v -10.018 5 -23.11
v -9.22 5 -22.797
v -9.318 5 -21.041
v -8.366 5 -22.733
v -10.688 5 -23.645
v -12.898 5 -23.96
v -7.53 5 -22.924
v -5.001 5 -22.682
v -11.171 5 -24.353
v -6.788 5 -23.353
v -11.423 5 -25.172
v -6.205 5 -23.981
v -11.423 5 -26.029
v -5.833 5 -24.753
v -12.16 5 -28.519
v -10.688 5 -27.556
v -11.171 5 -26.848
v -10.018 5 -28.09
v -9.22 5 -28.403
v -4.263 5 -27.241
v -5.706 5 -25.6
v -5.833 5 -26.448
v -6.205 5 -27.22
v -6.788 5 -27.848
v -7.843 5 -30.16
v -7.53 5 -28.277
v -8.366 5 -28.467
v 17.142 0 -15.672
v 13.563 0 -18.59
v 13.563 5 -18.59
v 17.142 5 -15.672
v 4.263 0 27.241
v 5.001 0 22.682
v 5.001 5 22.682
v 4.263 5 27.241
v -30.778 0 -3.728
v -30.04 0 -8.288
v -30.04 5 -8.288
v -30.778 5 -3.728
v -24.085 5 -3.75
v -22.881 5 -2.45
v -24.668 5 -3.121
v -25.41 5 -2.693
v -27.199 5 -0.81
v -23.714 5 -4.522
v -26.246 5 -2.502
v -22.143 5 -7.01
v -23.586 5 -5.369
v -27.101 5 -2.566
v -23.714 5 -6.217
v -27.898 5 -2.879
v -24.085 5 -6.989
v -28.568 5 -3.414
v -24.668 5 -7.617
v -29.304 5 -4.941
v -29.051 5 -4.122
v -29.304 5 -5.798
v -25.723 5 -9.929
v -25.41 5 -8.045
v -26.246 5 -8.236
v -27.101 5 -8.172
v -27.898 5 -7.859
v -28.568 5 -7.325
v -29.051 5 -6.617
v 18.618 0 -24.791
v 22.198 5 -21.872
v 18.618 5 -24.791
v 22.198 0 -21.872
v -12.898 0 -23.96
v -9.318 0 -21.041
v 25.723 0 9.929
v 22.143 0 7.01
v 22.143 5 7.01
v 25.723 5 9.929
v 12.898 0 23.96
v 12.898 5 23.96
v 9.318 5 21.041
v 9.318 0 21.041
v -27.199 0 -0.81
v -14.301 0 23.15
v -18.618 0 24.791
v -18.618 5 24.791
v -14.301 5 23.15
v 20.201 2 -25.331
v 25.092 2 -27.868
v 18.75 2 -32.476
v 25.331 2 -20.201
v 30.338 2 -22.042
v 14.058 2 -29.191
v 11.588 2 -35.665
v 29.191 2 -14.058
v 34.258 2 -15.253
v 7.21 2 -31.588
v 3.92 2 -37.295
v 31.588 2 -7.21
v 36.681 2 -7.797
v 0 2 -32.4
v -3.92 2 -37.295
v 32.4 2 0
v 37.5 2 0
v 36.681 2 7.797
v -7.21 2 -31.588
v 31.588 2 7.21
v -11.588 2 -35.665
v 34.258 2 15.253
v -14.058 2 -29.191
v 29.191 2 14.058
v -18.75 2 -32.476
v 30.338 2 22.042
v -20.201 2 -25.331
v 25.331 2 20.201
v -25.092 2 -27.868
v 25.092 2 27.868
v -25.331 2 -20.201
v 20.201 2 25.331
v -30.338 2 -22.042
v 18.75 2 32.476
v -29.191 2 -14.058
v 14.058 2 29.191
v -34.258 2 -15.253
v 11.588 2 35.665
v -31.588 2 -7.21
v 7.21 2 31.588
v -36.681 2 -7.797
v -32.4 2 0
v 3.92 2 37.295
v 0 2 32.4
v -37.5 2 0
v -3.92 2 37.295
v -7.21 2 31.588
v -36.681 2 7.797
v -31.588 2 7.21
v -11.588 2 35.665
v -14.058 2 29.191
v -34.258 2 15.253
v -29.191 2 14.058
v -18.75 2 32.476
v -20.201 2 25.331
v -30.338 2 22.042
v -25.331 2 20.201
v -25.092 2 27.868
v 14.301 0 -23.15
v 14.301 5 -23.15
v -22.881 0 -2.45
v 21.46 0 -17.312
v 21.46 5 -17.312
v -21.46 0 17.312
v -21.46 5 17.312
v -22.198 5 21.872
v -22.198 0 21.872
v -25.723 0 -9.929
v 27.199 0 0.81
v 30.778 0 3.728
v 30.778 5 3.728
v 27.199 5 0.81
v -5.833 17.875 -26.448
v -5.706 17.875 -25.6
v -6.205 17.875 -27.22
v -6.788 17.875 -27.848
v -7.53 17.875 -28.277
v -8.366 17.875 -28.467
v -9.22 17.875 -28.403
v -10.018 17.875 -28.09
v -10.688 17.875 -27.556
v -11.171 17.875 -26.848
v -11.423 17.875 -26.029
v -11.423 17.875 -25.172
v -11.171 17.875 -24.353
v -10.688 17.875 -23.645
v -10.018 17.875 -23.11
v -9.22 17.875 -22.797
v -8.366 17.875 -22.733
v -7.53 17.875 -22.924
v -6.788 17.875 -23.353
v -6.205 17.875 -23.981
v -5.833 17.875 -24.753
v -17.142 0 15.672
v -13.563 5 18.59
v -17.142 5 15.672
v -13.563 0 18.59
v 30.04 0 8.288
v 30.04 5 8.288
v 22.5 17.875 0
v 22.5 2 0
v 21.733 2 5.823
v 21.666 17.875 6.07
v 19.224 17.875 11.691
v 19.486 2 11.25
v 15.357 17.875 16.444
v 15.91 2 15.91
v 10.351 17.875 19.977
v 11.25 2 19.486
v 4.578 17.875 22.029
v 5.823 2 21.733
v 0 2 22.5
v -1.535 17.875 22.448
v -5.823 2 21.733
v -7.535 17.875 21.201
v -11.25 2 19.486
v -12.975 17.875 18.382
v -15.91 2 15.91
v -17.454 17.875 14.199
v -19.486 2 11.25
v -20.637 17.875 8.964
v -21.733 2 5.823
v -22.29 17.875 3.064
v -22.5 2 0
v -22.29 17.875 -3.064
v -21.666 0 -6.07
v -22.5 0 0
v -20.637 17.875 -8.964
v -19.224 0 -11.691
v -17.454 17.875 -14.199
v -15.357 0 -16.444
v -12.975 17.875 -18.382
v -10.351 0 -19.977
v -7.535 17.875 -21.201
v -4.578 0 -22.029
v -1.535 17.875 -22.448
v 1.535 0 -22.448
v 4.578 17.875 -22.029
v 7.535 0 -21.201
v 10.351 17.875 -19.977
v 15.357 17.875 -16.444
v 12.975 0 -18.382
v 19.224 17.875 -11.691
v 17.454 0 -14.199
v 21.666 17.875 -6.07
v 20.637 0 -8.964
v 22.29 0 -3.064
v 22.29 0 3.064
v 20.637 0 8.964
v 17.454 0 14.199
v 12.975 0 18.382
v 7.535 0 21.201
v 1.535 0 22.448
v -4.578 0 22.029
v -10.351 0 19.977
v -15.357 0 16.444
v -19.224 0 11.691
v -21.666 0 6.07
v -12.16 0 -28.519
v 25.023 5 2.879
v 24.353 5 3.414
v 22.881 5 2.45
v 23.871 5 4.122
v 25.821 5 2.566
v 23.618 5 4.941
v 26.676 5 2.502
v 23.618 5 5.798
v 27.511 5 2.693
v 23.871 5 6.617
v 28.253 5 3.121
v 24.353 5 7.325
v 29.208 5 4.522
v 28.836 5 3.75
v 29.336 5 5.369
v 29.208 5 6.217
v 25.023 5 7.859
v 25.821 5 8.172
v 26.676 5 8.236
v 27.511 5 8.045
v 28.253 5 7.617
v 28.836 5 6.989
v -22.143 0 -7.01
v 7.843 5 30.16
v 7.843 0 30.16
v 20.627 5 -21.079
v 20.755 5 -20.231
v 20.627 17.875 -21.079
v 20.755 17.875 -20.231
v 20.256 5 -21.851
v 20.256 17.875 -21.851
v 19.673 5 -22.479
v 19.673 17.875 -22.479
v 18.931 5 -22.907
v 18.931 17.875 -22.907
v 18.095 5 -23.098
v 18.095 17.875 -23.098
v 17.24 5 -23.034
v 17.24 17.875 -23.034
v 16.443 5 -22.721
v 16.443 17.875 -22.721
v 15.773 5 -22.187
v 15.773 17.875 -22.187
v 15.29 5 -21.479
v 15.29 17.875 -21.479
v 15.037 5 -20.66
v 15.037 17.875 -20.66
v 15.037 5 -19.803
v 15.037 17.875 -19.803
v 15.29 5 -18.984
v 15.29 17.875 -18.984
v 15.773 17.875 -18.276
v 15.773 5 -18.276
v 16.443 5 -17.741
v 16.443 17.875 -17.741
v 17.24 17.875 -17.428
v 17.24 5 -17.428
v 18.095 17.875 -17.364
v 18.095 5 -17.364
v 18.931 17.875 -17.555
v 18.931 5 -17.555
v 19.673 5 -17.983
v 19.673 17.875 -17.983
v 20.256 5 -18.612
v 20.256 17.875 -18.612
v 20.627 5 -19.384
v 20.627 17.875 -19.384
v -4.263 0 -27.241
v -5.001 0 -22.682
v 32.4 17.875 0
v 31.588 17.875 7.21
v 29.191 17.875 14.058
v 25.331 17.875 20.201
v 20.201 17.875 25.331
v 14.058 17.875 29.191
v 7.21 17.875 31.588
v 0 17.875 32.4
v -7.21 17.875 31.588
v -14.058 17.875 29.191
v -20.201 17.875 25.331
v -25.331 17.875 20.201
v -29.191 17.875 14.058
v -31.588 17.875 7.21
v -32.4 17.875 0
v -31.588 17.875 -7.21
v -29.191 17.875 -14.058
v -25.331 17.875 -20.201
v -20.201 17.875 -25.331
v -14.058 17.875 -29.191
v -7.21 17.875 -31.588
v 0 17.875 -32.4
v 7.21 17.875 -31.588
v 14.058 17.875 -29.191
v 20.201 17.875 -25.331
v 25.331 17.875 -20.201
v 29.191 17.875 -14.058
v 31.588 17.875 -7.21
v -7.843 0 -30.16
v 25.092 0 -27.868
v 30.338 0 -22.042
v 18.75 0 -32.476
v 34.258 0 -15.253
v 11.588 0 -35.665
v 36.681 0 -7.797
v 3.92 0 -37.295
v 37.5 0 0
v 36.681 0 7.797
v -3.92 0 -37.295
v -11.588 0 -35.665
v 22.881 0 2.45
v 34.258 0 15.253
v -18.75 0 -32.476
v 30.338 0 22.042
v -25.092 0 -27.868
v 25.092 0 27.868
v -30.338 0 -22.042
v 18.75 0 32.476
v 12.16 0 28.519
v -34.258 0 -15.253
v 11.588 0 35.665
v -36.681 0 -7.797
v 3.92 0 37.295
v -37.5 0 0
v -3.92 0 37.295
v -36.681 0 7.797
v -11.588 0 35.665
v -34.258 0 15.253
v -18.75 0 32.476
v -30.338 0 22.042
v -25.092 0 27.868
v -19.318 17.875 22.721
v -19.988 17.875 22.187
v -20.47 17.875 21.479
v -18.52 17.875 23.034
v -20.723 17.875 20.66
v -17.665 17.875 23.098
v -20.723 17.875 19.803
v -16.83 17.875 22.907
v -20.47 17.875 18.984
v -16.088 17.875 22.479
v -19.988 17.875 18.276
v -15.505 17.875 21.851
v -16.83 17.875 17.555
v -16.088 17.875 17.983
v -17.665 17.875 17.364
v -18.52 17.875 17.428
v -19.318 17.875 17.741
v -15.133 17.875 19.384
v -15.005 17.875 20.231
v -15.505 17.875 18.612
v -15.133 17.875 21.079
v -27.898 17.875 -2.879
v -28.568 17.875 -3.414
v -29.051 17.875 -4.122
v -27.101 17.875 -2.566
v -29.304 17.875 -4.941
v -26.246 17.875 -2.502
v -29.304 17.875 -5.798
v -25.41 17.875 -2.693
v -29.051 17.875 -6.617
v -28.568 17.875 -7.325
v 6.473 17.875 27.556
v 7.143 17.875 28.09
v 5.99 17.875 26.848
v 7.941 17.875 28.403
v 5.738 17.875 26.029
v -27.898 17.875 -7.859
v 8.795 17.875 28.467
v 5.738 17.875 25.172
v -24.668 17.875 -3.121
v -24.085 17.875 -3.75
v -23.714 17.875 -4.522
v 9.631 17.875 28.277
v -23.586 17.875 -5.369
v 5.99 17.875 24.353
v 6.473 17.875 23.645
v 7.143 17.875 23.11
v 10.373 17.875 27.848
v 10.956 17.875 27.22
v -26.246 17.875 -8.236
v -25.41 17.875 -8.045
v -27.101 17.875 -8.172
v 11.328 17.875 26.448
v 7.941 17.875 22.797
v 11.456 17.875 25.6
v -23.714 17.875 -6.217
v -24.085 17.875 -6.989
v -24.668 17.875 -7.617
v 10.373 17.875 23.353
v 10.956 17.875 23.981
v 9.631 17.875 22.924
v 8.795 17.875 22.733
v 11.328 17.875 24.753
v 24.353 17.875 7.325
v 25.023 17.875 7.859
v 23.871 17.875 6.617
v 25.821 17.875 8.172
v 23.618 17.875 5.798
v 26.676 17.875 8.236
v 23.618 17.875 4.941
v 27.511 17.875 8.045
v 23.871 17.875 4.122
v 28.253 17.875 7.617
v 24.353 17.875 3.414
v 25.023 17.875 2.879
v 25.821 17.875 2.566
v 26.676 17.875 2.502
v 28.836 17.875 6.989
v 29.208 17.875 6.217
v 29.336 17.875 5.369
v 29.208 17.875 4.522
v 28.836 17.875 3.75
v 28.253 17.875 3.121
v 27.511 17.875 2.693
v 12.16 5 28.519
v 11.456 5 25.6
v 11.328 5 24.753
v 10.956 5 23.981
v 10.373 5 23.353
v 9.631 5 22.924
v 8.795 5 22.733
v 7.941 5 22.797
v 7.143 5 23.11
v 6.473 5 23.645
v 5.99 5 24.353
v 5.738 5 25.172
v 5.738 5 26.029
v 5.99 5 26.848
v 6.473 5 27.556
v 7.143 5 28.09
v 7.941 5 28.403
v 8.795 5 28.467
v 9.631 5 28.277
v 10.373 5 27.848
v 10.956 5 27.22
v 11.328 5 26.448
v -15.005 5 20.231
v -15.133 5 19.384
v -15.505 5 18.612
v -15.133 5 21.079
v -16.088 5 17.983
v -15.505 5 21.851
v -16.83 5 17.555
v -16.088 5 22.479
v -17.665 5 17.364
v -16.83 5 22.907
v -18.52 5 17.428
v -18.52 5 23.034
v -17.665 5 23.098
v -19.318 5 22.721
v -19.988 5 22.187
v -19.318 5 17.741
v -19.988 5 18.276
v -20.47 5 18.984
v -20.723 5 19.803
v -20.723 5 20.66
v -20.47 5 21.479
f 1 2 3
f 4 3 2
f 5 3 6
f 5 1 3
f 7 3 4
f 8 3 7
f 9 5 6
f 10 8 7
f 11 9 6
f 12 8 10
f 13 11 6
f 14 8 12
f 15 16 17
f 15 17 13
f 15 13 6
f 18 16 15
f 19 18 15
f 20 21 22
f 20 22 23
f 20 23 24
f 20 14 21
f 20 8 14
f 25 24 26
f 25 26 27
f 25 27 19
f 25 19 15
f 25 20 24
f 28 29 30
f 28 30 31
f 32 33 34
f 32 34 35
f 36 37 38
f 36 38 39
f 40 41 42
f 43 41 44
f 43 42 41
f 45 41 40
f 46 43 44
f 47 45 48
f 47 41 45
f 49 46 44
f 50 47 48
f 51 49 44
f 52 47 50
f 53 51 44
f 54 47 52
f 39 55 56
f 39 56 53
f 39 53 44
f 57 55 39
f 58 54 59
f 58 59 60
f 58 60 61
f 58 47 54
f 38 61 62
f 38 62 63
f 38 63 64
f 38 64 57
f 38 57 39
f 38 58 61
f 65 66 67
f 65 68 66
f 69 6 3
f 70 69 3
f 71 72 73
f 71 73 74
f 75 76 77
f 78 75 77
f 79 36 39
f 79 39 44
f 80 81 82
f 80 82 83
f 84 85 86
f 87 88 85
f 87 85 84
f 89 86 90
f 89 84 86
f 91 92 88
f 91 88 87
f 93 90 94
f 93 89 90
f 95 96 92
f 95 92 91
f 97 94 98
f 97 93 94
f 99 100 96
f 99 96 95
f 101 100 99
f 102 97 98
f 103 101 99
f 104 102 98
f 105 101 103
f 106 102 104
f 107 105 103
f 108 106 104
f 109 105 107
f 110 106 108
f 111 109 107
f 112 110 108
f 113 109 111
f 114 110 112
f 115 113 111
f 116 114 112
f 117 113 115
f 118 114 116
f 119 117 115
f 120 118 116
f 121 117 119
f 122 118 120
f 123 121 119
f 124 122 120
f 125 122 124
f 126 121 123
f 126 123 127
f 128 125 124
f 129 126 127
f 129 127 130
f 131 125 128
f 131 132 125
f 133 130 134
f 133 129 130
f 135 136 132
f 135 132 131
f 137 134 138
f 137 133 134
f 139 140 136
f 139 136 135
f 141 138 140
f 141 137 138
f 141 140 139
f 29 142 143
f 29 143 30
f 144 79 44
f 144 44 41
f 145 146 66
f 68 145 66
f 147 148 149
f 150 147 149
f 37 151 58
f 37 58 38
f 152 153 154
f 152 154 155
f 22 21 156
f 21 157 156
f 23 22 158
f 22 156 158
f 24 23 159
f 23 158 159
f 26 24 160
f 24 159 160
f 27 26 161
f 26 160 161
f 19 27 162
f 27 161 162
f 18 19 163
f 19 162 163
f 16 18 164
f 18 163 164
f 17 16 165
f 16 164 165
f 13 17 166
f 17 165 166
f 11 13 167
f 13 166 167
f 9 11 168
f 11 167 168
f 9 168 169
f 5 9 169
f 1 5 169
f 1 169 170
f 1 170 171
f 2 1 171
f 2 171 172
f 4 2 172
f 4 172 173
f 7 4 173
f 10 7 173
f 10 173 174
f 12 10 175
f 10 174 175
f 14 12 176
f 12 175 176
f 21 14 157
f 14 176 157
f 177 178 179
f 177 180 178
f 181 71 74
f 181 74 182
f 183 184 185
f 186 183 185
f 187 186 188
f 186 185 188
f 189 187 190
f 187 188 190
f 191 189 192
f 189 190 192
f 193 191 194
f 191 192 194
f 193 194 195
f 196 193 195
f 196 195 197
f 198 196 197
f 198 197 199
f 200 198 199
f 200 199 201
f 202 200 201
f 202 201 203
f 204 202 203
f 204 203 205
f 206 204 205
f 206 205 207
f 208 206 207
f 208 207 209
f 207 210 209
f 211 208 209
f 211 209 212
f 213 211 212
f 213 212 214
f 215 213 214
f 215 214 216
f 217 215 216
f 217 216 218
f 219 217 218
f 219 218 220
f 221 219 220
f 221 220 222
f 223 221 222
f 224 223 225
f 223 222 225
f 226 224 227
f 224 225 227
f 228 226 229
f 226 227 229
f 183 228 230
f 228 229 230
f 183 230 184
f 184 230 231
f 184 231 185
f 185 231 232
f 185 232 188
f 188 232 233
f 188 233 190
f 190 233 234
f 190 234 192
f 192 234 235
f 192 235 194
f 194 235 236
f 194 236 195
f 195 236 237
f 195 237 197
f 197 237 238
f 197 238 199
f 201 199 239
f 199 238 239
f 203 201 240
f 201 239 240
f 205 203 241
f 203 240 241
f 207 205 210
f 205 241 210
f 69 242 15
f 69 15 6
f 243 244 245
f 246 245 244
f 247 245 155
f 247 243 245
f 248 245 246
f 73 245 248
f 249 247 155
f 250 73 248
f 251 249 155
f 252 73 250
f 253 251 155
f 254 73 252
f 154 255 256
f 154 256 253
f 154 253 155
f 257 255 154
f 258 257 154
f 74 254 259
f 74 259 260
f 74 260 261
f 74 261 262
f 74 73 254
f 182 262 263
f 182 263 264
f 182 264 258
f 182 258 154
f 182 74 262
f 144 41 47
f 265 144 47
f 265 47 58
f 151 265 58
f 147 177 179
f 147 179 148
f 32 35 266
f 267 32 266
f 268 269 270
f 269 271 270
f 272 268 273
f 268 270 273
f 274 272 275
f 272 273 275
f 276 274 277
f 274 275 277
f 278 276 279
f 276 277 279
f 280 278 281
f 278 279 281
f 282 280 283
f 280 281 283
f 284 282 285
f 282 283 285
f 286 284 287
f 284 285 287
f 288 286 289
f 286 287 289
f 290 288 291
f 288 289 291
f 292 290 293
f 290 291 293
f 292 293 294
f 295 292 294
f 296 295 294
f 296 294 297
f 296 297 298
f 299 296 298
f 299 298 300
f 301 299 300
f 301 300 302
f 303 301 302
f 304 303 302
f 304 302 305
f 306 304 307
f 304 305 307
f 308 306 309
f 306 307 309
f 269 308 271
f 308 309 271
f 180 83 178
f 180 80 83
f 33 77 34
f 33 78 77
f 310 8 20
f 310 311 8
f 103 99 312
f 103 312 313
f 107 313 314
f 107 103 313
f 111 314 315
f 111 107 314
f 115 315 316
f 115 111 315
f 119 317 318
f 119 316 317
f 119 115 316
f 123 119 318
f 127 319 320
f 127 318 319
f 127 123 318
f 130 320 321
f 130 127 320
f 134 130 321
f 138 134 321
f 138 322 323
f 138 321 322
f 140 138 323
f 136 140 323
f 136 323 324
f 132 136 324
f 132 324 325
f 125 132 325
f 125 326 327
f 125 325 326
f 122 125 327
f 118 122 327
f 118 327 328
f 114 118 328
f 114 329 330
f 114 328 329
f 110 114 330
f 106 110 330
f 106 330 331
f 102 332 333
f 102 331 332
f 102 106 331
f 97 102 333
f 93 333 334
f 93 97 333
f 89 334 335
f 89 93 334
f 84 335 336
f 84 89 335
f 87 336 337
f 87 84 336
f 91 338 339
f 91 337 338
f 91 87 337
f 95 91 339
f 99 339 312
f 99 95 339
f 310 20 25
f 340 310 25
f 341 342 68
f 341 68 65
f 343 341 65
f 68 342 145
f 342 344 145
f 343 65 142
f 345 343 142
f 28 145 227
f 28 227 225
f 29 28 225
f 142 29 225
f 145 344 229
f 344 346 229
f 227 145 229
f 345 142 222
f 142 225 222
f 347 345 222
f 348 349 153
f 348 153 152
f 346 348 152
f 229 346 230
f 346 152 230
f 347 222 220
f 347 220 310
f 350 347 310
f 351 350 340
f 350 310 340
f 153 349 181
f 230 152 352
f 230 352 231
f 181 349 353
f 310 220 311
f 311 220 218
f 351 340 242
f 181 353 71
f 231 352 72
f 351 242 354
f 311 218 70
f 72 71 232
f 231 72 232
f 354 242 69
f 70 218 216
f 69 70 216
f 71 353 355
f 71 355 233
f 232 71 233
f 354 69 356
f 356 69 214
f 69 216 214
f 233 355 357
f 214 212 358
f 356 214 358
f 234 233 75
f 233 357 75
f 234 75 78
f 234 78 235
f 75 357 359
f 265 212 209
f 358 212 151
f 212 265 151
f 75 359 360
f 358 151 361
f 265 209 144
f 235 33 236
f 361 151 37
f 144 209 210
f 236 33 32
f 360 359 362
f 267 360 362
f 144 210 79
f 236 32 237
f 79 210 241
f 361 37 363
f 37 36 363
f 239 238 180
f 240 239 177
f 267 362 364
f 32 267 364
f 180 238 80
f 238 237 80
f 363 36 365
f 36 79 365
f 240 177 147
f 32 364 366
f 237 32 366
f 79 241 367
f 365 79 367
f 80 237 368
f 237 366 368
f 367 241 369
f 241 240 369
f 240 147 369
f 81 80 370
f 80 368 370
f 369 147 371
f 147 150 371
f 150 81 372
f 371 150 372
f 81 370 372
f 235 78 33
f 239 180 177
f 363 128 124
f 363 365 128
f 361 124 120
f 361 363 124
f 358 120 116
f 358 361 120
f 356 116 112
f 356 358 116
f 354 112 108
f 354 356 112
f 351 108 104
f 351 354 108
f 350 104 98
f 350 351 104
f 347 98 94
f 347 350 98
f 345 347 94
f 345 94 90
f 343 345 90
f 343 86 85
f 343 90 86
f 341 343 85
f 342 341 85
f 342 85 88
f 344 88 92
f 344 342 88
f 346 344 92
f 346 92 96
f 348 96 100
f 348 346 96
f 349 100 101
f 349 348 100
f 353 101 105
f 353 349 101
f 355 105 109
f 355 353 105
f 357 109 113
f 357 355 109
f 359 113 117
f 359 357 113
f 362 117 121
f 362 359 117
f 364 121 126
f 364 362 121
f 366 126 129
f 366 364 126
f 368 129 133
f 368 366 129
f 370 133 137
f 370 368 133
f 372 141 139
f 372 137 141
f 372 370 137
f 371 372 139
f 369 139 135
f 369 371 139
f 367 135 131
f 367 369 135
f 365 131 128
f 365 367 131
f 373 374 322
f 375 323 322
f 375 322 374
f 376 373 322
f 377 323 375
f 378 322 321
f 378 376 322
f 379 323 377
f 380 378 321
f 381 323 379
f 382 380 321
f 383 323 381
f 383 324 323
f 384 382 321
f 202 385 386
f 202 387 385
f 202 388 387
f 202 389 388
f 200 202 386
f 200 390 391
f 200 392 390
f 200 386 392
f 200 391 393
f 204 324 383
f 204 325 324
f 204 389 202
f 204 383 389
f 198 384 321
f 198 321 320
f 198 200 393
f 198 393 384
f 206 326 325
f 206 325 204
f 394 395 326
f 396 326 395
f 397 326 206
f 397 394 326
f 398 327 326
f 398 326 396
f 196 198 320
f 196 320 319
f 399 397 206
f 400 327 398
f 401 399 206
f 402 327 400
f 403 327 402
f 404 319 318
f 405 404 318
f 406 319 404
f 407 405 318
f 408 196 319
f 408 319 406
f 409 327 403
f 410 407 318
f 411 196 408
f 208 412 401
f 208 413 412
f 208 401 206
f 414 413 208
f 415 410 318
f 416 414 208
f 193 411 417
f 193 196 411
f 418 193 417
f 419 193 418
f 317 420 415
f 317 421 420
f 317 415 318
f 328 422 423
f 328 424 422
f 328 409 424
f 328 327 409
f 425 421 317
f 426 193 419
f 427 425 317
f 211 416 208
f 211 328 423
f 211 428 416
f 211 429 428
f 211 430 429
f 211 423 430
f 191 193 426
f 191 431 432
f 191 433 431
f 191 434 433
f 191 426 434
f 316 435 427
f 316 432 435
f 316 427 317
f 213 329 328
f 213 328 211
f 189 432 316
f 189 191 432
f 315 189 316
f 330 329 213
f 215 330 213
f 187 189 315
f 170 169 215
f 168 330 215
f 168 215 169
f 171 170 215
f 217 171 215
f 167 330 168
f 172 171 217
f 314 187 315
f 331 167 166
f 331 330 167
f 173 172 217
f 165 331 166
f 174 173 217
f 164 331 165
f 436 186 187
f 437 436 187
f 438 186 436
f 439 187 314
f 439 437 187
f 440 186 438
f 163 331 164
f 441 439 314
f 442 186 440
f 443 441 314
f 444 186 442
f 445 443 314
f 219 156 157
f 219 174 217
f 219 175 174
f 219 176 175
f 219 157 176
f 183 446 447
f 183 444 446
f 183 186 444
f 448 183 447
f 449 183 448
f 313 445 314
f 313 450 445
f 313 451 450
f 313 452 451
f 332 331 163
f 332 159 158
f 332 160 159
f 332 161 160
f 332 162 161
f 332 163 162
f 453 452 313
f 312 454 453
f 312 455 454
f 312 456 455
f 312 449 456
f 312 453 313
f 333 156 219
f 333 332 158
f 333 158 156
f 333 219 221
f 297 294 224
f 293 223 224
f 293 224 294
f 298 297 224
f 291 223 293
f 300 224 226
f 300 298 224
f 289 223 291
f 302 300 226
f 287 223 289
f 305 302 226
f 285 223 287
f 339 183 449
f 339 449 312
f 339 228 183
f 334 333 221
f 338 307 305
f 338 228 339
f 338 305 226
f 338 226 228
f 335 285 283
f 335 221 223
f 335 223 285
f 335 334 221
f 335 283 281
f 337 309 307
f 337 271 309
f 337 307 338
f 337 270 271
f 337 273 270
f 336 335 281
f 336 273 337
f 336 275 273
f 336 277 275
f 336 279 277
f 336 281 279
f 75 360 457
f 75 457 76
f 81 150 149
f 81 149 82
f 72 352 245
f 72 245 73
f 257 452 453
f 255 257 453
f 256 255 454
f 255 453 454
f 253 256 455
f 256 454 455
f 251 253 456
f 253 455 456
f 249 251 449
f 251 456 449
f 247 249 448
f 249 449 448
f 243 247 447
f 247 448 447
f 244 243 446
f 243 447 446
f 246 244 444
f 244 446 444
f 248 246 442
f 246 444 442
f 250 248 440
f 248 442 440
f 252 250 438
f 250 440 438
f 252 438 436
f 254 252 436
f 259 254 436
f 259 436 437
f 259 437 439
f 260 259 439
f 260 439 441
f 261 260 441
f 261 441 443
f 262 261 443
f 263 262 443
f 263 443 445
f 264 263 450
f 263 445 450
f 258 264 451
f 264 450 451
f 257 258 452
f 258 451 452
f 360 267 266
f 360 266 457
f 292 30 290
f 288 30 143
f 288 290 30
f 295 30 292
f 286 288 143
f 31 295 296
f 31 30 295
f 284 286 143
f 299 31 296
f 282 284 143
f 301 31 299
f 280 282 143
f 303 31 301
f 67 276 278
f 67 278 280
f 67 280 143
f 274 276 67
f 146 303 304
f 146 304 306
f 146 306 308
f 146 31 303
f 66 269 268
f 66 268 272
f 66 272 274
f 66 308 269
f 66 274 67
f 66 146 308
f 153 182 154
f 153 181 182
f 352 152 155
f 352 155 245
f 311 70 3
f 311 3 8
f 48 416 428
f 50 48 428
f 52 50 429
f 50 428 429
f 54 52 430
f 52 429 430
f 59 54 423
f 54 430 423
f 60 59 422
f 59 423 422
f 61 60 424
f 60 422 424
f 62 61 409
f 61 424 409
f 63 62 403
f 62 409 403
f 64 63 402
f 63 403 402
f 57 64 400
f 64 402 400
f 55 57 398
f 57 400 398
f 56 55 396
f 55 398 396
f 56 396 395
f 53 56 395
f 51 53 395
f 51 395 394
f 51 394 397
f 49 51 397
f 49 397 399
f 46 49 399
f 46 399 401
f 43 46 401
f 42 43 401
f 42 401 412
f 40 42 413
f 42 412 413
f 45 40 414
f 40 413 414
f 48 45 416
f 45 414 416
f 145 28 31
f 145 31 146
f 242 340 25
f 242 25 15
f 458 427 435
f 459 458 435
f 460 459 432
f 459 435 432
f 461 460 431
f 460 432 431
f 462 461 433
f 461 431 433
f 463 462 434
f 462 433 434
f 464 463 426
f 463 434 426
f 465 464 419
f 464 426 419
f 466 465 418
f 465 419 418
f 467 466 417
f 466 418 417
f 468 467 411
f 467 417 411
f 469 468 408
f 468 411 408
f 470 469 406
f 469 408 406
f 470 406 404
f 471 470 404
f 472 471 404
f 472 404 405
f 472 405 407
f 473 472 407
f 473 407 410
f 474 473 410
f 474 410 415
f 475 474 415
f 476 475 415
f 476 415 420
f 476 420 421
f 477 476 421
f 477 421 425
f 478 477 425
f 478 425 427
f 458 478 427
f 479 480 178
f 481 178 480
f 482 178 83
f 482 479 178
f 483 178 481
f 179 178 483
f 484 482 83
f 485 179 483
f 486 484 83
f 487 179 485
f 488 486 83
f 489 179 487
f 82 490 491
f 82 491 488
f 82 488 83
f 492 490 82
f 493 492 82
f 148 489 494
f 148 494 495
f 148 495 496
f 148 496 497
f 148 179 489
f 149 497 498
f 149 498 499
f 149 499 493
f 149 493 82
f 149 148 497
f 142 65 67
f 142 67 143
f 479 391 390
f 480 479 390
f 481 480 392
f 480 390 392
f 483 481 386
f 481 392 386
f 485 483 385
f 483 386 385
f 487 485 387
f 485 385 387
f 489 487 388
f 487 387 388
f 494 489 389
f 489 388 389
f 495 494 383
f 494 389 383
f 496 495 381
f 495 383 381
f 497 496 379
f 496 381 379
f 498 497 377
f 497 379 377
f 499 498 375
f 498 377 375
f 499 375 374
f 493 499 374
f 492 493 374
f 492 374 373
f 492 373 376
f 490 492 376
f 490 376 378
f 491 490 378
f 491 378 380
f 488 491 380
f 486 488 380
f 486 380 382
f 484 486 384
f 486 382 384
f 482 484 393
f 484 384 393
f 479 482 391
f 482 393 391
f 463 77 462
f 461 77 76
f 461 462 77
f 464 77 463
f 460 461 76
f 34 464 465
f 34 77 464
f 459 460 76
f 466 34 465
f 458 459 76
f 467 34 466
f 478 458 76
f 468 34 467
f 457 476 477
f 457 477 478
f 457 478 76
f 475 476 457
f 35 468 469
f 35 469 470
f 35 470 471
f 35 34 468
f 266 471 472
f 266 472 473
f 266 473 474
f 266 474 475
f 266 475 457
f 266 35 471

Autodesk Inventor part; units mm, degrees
ref_plane "YZ Plane" through (0, 0, 0) normal (1, 0, 0) x (0, 1, 0)
ref_plane "XZ Plane" through (0, 0, 0) normal (0, 1, 0) x (-1, 0, 0)
ref_plane "XY Plane" through (0, 0, 0) normal (0, 0, 1) x (1, 0, 0)
sketch "Sketch1" plane through (0, 0, 0) normal (0, 1, 0) x (-1, 0, 0)
  circle A0 centre (0, 0) radius 22.5
  circle A1 centre (0, 0) radius 37.5
  dimension "d0" = 45
  dimension "d1" = 75
extrude "Extrusion1" add sketch "Sketch1" along normal blind 2
sketch "Sketch2" plane through (0, 2, 0) normal (0, 1, 0) x (1, 0, 0)
  circle A0 centre (0, 0) radius 37.5 projected
  circle A1 centre (0, 0) radius 22.5 projected
  circle A2 centre (0, 0) radius 32.4
  dimension "d4" = 64.8
extrude "Extrusion2" add sketch "Sketch2" along normal blind 15.875 contours A2
feature "FaceDraft1" [suppressed]
sketch "Sketch3" plane through (0, 17.875, 0) normal (0, 1, 0) x (1, 0, 0)
  circle A0 centre (26.4608, -5.3692) radius 2.875 projected
  circle A1 centre (17.8802, 20.2311) radius 2.875 projected
  circle A2 centre (-8.5805, 25.6003) radius 2.875 projected
  circle A3 centre (-26.4608, 5.3692) radius 2.875 projected
  circle A4 centre (-17.8802, -20.2311) radius 2.875 projected
  circle A5 centre (8.5805, -25.6003) radius 2.875 projected
  point P0 (0, 0)
extrude "Extrusion3" cut sketch "Sketch3" against normal through all
sketch "Sketch4" plane through (0, 0, 0) normal (0, -1, 0) x (1, 0, 0)
  circle A0 centre (26.4608, 5.3692) radius 2.875 projected
  line L0 (30.7783, 3.7285) -> (27.1986, 0.8097)
  line L1 (27.1986, 0.8097) -> (22.8811, 2.4504)
  line L2 (22.8811, 2.4504) -> (22.1432, 7.0099)
  line L3 (22.1432, 7.0099) -> (25.7229, 9.9287)
  line L4 (25.7229, 9.9287) -> (30.0404, 8.2879)
  line L5 (30.0404, 8.2879) -> (30.7783, 3.7285)
  point P0 (0, 0)
  dimension "d10" = 8
extrude "Extrusion4" cut sketch "Sketch4" against normal blind 5 contours A0 | L0 L1 L2 L3 L4 L5
pattern_circular "Circular Pattern1" count 6 over 360 about axis through (0, 2, 0) along (0, 1, 0) of "Extrusion4"
properties part number "j1FlangeV2"
